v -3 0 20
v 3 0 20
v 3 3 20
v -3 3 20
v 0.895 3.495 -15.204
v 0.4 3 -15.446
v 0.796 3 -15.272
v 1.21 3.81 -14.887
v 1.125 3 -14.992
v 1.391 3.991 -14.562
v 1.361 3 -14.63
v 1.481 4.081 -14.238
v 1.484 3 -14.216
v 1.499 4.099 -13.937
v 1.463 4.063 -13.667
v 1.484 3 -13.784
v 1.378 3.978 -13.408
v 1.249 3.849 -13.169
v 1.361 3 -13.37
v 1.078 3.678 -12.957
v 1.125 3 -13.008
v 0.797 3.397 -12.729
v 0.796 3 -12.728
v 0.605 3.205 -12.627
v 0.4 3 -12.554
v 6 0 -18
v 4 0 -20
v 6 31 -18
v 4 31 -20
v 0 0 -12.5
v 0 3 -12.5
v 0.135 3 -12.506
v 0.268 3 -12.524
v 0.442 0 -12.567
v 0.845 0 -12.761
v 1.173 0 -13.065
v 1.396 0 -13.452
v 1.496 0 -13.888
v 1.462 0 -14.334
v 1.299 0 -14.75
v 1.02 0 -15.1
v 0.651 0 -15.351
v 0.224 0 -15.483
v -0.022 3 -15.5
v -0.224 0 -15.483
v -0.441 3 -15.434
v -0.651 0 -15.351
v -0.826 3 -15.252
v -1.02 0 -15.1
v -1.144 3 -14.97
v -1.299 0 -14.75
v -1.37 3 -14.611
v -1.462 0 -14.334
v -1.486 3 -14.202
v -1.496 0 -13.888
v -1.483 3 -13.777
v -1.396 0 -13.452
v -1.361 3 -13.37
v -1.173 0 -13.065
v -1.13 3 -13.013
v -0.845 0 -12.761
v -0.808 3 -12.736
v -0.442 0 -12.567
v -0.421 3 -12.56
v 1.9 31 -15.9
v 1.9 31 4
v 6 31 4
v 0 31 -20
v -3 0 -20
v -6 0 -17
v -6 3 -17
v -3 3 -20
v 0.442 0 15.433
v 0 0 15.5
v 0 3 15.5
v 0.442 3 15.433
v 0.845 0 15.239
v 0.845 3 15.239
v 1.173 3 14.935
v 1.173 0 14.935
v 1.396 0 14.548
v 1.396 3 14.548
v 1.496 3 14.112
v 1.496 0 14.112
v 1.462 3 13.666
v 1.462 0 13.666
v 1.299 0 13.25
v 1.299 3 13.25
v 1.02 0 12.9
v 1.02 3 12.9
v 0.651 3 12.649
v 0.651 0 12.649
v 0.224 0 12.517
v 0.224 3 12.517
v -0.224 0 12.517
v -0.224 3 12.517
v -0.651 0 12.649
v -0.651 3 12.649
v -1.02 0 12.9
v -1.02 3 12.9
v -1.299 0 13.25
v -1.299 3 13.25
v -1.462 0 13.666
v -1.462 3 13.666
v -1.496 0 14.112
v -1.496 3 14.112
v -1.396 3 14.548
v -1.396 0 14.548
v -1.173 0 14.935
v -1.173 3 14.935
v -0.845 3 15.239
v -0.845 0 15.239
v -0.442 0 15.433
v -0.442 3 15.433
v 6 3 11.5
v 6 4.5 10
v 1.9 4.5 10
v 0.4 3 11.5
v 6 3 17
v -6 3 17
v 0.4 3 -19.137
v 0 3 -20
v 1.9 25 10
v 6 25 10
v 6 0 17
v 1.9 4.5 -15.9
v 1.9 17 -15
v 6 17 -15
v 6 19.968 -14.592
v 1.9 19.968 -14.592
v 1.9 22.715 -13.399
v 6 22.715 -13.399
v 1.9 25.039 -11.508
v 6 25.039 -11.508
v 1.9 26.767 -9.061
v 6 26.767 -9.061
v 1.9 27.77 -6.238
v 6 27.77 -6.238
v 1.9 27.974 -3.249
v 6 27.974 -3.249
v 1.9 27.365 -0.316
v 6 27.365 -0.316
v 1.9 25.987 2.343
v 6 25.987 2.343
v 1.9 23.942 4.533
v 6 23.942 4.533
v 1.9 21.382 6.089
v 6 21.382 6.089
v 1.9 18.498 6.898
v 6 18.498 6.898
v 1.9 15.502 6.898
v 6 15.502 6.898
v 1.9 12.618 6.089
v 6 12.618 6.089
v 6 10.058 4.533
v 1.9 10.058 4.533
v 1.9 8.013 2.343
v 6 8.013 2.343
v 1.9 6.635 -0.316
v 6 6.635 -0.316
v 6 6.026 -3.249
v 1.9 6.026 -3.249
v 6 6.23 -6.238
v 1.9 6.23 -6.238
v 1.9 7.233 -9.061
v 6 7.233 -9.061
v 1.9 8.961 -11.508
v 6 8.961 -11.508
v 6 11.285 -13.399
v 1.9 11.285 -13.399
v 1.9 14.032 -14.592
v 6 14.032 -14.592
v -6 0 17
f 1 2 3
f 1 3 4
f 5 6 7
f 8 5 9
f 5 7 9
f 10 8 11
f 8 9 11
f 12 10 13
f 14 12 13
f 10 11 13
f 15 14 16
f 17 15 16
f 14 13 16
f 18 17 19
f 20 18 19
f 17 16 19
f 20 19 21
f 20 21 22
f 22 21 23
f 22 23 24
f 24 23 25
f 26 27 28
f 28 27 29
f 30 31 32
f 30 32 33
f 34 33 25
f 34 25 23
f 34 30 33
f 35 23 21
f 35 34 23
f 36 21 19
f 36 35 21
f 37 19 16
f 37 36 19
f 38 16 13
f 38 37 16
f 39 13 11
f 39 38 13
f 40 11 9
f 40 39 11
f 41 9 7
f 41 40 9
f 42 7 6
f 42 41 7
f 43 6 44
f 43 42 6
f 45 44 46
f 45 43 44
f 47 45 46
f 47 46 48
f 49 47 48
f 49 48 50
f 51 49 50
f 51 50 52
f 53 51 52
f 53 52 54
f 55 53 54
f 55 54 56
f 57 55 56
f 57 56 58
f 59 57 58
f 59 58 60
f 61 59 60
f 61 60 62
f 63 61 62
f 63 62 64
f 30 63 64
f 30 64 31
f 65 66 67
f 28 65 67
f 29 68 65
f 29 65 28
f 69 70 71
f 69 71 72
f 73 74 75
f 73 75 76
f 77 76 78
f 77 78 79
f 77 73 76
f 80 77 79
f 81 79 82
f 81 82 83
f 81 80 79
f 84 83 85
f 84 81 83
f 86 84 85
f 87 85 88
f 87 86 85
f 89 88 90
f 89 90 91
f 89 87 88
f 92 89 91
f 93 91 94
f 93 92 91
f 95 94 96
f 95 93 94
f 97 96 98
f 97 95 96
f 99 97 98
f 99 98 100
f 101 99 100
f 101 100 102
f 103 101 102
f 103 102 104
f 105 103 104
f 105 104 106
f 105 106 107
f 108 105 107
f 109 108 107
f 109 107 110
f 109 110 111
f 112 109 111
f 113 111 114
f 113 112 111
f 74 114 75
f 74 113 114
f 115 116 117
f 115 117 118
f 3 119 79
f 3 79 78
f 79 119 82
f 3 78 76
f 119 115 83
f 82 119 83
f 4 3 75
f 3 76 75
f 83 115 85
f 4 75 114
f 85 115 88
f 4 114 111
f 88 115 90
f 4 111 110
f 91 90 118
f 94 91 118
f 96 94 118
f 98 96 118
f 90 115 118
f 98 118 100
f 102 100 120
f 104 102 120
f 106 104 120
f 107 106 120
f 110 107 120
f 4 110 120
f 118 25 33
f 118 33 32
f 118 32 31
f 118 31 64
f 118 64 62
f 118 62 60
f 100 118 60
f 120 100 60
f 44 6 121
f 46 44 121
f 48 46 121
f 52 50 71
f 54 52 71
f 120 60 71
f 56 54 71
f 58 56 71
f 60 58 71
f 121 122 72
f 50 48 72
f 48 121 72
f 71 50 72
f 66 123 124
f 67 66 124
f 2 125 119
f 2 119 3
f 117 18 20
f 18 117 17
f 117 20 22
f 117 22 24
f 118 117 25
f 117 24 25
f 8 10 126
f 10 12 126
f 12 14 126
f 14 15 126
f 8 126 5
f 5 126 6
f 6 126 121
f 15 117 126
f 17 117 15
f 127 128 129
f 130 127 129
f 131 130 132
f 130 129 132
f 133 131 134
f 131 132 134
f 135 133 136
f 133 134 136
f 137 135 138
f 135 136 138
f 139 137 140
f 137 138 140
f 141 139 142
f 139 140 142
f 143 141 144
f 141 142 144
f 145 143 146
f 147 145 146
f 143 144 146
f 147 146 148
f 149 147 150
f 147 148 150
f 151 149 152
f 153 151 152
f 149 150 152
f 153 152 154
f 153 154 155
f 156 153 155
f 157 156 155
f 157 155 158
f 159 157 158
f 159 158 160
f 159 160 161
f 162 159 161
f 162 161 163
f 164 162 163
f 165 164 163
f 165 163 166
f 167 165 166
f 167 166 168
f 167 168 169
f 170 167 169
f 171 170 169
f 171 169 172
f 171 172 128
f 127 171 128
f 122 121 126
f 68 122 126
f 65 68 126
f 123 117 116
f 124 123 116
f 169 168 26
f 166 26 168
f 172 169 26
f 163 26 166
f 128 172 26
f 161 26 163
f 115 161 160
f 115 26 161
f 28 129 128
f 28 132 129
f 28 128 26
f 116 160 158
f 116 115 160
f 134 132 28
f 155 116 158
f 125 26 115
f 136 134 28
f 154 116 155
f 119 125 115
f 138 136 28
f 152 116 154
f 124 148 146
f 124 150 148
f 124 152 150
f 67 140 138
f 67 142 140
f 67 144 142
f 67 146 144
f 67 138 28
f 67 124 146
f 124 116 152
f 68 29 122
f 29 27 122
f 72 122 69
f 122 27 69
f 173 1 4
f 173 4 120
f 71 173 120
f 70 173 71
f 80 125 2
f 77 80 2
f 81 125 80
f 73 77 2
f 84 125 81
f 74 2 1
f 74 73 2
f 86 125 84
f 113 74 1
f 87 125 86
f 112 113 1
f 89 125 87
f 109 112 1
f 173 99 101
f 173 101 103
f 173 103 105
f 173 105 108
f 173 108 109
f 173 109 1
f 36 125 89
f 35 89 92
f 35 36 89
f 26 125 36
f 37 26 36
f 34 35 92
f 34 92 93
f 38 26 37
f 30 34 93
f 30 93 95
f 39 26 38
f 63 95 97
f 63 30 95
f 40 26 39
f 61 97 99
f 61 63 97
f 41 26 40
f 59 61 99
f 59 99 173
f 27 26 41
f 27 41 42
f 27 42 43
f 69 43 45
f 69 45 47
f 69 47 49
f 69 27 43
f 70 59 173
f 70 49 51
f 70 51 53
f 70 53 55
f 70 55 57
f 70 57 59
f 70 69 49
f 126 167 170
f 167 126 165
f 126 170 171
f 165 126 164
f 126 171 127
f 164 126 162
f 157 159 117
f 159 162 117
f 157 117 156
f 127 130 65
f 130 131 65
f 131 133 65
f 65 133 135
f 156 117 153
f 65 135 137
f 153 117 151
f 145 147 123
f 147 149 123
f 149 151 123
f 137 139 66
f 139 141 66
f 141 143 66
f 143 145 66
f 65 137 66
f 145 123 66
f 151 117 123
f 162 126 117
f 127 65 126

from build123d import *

# Parameters (mm, degrees)
SKETCH1_R           = 1.5
BOSS_EXTRUDE1_DEPTH = 3
BOSS_EXTRUDE2_DEPTH = 28
CHAMFER1_SIZE       = 2
SKETCH4_R           = 11
CUT_EXTRUDE1_DEPTH  = 11
CHAMFER2_SIZE       = 6
CHAMFER3_SIZE       = 1.5


with BuildPart() as part:
    # Sketch1 → Boss-Extrude1 (new body)
    with BuildSketch(Plane(origin=(0, 0, 0), x_dir=(1, 0, 0), z_dir=(0, 1, 0))):
        Polygon((-6, 17), (-3, 20), (6, 20), (6, -17), (3, -20), (-3, -20), (-6, -17), align=None)
        with Locations(Location((0, 14, 0), (0, 0, 270))):
            Circle(SKETCH1_R, mode=Mode.SUBTRACT)
        with Locations(Location((0, -14, 0), (0, 0, 270))):
            Circle(SKETCH1_R, mode=Mode.SUBTRACT)
    extrude(amount=BOSS_EXTRUDE1_DEPTH)

    # Sketch2 → Boss-Extrude2 (add)
    with BuildSketch(Plane(origin=(0, 3, 0), x_dir=(1, 0, 0), z_dir=(0, 1, 0))):
        Polygon((6, -10), (6, 20), (0, 20), (1.9, 15.9), (1.9, -10), align=None)
    extrude(amount=BOSS_EXTRUDE2_DEPTH)

    # Chamfer1
    chamfer1_edges = [part.edges().sort_by_distance(p)[0] for p in [
        (6, 15.5, -20),
    ]]
    chamfer(chamfer1_edges, length=CHAMFER1_SIZE)

    # Sketch4 → Cut-Extrude1 (cut)
    with BuildSketch(Plane(origin=(6, 0, 0), x_dir=(0, 0, -1), z_dir=(1, 0, 0))):
        with Locations((4, 17)):
            Circle(SKETCH4_R)
    extrude(amount=-CUT_EXTRUDE1_DEPTH, mode=Mode.SUBTRACT)

    # Chamfer2
    chamfer2_edges = [part.edges().sort_by_distance(p)[0] for p in [
        (3.95, 31, 10),
    ]]
    chamfer(chamfer2_edges, length=CHAMFER2_SIZE)

    # Chamfer3
    # the kernel refuses this chamfer: 1.5 mm, written as the material it adds along each edge
    with BuildSketch(Plane(origin=(1.9, 3, 10), x_dir=(0, 0.9996219169112968, -0.02749587661058678), z_dir=(1, 0, 0))) as chamfer3_piece_1:
        Polygon((CHAMFER3_SIZE * 0.999621916911, CHAMFER3_SIZE * 0.0274958766106), (-CHAMFER3_SIZE * 0.0274958766106, CHAMFER3_SIZE * 0.999621916911), (0, 0), align=None)
    extrude(amount=4.1)
    with BuildSketch(Plane(origin=(1.9, 3, -19.757524482), x_dir=(0.02749587661058635, 0.9996219169112968, 0), z_dir=(0, 0, 1))) as chamfer3_piece_2_section:
        Polygon((CHAMFER3_SIZE * 0.999621916911, CHAMFER3_SIZE * 0.0274958766106), (-CHAMFER3_SIZE * 0.0274958766106, CHAMFER3_SIZE * 0.999621916911), (0, 0), align=None)
    chamfer3_piece_2 = extrude(amount=29.757524482, mode=Mode.PRIVATE)
    chamfer3_piece_2 = chamfer3_piece_2 - Plane(origin=(0, 3.553768572, -14), x_dir=(0, 0, 1), z_dir=(0, -1, 0)) * Cylinder(1.5, 66, mode=Mode.PRIVATE)
    add(chamfer3_piece_2)
    with BuildSketch(Plane(origin=(1.9, 3, -19.757524482), x_dir=(0.02749587661058635, 0.9996219169112968, 0), z_dir=(0, 0, 1))) as chamfer3_piece_3a_section:
        Polygon((CHAMFER3_SIZE * 0.999621916911, CHAMFER3_SIZE * 0.0274958766106), (-CHAMFER3_SIZE * 0.0274958766106, CHAMFER3_SIZE * 0.999621916911), (0, 0), align=None)
    chamfer3_piece_3a = extrude(amount=33.615048964, mode=Mode.PRIVATE)
    chamfer3_piece_3a = split(chamfer3_piece_3a, bisect_by=Plane(origin=(1.452851003, 3.519674643, 10), z_dir=(0, 0, 1)), keep=Keep.TOP, mode=Mode.PRIVATE)
    chamfer3_piece_3a = chamfer3_piece_3a - Plane(origin=(0, 3.519674643, 14), x_dir=(0, 0, 1), z_dir=(0, -1, 0)) * Cylinder(1.5, 74, mode=Mode.PRIVATE)
    with BuildSketch(Plane(origin=(-1.957524482, 3, 10), x_dir=(0, 0.9996219169112968, -0.02749587661058678), z_dir=(1, 0, 0))) as chamfer3_piece_3b_section:
        Polygon((CHAMFER3_SIZE * 0.999621916911, CHAMFER3_SIZE * 0.0274958766106), (-CHAMFER3_SIZE * 0.0274958766106, CHAMFER3_SIZE * 0.999621916911), (0, 0), align=None)
    chamfer3_piece_3b = extrude(amount=7.957524482, mode=Mode.PRIVATE)
    chamfer3_piece_3b = split(chamfer3_piece_3b, bisect_by=Plane(origin=(1.9, 3.49469044, 10.49469044), z_dir=(-1, 0, 0)), keep=Keep.TOP, mode=Mode.PRIVATE)
    chamfer3_piece_3 = chamfer3_piece_3a & chamfer3_piece_3b
    add(chamfer3_piece_3)


solid = part.part
